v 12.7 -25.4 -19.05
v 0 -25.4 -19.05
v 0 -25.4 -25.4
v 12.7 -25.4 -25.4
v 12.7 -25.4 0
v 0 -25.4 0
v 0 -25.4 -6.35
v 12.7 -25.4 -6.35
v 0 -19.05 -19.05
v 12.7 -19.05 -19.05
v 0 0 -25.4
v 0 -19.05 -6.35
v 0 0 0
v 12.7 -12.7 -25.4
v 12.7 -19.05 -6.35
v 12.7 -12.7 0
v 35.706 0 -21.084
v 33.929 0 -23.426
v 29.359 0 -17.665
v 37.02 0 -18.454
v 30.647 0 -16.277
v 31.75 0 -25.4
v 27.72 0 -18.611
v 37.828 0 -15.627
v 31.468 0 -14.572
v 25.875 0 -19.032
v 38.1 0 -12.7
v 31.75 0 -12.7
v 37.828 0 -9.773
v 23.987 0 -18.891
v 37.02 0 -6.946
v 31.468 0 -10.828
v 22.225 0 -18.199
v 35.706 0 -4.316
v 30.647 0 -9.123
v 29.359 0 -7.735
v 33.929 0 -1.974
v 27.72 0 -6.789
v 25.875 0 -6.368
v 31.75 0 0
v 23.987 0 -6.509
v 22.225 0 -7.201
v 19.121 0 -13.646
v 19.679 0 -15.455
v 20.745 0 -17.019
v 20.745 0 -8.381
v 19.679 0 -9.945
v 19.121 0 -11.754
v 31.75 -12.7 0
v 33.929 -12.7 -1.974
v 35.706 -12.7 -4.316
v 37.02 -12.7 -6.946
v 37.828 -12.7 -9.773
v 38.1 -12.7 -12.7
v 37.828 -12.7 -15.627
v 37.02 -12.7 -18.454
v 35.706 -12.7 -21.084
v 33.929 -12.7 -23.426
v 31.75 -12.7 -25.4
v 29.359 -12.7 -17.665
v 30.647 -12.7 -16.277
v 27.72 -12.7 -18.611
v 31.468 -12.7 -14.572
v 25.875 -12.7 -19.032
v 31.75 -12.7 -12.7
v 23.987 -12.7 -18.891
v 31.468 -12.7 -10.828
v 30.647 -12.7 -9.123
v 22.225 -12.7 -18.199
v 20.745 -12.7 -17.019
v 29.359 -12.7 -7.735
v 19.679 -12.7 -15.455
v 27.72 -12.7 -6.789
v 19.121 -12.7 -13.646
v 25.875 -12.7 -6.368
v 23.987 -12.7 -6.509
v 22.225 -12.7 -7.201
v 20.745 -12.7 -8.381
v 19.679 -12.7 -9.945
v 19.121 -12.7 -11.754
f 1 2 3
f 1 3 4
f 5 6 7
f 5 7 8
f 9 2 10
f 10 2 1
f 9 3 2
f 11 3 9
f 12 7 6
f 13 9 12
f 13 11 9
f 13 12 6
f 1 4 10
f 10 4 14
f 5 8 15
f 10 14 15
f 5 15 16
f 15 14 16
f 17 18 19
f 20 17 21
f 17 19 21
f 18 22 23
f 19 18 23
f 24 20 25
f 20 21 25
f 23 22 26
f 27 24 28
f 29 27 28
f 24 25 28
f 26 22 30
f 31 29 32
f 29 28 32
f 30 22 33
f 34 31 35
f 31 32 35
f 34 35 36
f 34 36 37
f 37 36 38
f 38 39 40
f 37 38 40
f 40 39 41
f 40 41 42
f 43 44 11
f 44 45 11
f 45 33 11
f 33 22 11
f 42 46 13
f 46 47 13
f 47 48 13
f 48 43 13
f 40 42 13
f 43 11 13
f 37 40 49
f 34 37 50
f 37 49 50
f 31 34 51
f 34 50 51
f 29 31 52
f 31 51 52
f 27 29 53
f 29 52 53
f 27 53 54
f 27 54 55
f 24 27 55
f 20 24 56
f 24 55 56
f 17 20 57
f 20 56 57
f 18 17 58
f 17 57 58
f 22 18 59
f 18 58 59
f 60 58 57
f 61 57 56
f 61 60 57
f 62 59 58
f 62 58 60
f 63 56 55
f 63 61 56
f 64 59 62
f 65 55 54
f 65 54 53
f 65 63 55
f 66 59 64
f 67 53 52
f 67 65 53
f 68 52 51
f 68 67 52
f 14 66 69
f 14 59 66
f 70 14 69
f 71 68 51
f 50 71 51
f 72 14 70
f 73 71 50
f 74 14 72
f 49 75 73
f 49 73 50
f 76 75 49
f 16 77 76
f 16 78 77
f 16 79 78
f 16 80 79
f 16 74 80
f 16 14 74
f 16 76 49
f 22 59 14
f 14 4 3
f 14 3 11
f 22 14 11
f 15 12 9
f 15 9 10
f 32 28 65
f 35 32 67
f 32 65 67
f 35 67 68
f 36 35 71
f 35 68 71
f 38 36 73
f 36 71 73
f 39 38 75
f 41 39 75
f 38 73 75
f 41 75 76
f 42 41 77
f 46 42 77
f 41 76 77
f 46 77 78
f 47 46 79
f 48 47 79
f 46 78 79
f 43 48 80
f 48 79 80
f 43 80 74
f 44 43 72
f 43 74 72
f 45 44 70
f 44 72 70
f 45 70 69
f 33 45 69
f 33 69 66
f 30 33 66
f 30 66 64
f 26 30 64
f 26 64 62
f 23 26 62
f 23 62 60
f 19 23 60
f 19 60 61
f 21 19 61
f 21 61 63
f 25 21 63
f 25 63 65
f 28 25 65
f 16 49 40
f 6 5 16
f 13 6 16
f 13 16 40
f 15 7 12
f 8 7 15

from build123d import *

# Parameters (mm, degrees)
F0_W     = 12.7
F0_H     = 25.4
F1_DEPTH = 25.4
F2_W     = 12.7
F2_H     = 12.7
F3_DEPTH = 6.35
F4_W     = 12.7
F4_H     = 25.4
F5_DEPTH = 25.4
F7_DEPTH = 12.701
F8_R     = 6.35
F9_DEPTH = 12.701


with BuildPart() as f1:
    # F0 (on Front) → F1 (new body)
    with BuildSketch(Plane.XZ):
        with Locations((6.35, -12.7)):
            Rectangle(F0_W, F0_H)
    extrude(amount=F1_DEPTH)

    # F2 (on face) → F3 (cut)
    with BuildSketch(Plane.XZ.offset(25.4)):
        with Locations((6.35, -12.7)):
            Rectangle(F2_W, F2_H)
    extrude(amount=-F3_DEPTH, mode=Mode.SUBTRACT)

    # F4 (on face) → F5 (join)
    with BuildSketch(Plane.YZ.offset(12.7)):
        with Locations((-6.35, -12.7)):
            Rectangle(F4_W, F4_H)
    extrude(amount=F5_DEPTH)

    # F6 (on face) → F7 (cut, through all)
    with BuildSketch(Plane.XZ.offset(12.7)):
        with BuildLine():
            ThreePointArc((38.1, -12.7), (36.424032, -19.799516), (31.75, -25.4))
            Line((31.75, -25.4), (38.1, -25.4))
            Line((38.1, -25.4), (38.1, -12.7))
        make_face()
        with BuildLine():
            ThreePointArc((31.75, 0), (36.424032, -5.600484), (38.1, -12.7))
            Line((38.1, -12.7), (38.1, 0))
            Line((38.1, 0), (31.75, 0))
        make_face()
    extrude(amount=-F7_DEPTH, mode=Mode.SUBTRACT)

    # F8 (on face) → F9 (cut, through all)
    with BuildSketch(Plane.XZ.offset(12.7)):
        with Locations((25.4, -12.7)):
            Circle(F8_R)
    extrude(amount=-F9_DEPTH, mode=Mode.SUBTRACT)


solid = f1.part
